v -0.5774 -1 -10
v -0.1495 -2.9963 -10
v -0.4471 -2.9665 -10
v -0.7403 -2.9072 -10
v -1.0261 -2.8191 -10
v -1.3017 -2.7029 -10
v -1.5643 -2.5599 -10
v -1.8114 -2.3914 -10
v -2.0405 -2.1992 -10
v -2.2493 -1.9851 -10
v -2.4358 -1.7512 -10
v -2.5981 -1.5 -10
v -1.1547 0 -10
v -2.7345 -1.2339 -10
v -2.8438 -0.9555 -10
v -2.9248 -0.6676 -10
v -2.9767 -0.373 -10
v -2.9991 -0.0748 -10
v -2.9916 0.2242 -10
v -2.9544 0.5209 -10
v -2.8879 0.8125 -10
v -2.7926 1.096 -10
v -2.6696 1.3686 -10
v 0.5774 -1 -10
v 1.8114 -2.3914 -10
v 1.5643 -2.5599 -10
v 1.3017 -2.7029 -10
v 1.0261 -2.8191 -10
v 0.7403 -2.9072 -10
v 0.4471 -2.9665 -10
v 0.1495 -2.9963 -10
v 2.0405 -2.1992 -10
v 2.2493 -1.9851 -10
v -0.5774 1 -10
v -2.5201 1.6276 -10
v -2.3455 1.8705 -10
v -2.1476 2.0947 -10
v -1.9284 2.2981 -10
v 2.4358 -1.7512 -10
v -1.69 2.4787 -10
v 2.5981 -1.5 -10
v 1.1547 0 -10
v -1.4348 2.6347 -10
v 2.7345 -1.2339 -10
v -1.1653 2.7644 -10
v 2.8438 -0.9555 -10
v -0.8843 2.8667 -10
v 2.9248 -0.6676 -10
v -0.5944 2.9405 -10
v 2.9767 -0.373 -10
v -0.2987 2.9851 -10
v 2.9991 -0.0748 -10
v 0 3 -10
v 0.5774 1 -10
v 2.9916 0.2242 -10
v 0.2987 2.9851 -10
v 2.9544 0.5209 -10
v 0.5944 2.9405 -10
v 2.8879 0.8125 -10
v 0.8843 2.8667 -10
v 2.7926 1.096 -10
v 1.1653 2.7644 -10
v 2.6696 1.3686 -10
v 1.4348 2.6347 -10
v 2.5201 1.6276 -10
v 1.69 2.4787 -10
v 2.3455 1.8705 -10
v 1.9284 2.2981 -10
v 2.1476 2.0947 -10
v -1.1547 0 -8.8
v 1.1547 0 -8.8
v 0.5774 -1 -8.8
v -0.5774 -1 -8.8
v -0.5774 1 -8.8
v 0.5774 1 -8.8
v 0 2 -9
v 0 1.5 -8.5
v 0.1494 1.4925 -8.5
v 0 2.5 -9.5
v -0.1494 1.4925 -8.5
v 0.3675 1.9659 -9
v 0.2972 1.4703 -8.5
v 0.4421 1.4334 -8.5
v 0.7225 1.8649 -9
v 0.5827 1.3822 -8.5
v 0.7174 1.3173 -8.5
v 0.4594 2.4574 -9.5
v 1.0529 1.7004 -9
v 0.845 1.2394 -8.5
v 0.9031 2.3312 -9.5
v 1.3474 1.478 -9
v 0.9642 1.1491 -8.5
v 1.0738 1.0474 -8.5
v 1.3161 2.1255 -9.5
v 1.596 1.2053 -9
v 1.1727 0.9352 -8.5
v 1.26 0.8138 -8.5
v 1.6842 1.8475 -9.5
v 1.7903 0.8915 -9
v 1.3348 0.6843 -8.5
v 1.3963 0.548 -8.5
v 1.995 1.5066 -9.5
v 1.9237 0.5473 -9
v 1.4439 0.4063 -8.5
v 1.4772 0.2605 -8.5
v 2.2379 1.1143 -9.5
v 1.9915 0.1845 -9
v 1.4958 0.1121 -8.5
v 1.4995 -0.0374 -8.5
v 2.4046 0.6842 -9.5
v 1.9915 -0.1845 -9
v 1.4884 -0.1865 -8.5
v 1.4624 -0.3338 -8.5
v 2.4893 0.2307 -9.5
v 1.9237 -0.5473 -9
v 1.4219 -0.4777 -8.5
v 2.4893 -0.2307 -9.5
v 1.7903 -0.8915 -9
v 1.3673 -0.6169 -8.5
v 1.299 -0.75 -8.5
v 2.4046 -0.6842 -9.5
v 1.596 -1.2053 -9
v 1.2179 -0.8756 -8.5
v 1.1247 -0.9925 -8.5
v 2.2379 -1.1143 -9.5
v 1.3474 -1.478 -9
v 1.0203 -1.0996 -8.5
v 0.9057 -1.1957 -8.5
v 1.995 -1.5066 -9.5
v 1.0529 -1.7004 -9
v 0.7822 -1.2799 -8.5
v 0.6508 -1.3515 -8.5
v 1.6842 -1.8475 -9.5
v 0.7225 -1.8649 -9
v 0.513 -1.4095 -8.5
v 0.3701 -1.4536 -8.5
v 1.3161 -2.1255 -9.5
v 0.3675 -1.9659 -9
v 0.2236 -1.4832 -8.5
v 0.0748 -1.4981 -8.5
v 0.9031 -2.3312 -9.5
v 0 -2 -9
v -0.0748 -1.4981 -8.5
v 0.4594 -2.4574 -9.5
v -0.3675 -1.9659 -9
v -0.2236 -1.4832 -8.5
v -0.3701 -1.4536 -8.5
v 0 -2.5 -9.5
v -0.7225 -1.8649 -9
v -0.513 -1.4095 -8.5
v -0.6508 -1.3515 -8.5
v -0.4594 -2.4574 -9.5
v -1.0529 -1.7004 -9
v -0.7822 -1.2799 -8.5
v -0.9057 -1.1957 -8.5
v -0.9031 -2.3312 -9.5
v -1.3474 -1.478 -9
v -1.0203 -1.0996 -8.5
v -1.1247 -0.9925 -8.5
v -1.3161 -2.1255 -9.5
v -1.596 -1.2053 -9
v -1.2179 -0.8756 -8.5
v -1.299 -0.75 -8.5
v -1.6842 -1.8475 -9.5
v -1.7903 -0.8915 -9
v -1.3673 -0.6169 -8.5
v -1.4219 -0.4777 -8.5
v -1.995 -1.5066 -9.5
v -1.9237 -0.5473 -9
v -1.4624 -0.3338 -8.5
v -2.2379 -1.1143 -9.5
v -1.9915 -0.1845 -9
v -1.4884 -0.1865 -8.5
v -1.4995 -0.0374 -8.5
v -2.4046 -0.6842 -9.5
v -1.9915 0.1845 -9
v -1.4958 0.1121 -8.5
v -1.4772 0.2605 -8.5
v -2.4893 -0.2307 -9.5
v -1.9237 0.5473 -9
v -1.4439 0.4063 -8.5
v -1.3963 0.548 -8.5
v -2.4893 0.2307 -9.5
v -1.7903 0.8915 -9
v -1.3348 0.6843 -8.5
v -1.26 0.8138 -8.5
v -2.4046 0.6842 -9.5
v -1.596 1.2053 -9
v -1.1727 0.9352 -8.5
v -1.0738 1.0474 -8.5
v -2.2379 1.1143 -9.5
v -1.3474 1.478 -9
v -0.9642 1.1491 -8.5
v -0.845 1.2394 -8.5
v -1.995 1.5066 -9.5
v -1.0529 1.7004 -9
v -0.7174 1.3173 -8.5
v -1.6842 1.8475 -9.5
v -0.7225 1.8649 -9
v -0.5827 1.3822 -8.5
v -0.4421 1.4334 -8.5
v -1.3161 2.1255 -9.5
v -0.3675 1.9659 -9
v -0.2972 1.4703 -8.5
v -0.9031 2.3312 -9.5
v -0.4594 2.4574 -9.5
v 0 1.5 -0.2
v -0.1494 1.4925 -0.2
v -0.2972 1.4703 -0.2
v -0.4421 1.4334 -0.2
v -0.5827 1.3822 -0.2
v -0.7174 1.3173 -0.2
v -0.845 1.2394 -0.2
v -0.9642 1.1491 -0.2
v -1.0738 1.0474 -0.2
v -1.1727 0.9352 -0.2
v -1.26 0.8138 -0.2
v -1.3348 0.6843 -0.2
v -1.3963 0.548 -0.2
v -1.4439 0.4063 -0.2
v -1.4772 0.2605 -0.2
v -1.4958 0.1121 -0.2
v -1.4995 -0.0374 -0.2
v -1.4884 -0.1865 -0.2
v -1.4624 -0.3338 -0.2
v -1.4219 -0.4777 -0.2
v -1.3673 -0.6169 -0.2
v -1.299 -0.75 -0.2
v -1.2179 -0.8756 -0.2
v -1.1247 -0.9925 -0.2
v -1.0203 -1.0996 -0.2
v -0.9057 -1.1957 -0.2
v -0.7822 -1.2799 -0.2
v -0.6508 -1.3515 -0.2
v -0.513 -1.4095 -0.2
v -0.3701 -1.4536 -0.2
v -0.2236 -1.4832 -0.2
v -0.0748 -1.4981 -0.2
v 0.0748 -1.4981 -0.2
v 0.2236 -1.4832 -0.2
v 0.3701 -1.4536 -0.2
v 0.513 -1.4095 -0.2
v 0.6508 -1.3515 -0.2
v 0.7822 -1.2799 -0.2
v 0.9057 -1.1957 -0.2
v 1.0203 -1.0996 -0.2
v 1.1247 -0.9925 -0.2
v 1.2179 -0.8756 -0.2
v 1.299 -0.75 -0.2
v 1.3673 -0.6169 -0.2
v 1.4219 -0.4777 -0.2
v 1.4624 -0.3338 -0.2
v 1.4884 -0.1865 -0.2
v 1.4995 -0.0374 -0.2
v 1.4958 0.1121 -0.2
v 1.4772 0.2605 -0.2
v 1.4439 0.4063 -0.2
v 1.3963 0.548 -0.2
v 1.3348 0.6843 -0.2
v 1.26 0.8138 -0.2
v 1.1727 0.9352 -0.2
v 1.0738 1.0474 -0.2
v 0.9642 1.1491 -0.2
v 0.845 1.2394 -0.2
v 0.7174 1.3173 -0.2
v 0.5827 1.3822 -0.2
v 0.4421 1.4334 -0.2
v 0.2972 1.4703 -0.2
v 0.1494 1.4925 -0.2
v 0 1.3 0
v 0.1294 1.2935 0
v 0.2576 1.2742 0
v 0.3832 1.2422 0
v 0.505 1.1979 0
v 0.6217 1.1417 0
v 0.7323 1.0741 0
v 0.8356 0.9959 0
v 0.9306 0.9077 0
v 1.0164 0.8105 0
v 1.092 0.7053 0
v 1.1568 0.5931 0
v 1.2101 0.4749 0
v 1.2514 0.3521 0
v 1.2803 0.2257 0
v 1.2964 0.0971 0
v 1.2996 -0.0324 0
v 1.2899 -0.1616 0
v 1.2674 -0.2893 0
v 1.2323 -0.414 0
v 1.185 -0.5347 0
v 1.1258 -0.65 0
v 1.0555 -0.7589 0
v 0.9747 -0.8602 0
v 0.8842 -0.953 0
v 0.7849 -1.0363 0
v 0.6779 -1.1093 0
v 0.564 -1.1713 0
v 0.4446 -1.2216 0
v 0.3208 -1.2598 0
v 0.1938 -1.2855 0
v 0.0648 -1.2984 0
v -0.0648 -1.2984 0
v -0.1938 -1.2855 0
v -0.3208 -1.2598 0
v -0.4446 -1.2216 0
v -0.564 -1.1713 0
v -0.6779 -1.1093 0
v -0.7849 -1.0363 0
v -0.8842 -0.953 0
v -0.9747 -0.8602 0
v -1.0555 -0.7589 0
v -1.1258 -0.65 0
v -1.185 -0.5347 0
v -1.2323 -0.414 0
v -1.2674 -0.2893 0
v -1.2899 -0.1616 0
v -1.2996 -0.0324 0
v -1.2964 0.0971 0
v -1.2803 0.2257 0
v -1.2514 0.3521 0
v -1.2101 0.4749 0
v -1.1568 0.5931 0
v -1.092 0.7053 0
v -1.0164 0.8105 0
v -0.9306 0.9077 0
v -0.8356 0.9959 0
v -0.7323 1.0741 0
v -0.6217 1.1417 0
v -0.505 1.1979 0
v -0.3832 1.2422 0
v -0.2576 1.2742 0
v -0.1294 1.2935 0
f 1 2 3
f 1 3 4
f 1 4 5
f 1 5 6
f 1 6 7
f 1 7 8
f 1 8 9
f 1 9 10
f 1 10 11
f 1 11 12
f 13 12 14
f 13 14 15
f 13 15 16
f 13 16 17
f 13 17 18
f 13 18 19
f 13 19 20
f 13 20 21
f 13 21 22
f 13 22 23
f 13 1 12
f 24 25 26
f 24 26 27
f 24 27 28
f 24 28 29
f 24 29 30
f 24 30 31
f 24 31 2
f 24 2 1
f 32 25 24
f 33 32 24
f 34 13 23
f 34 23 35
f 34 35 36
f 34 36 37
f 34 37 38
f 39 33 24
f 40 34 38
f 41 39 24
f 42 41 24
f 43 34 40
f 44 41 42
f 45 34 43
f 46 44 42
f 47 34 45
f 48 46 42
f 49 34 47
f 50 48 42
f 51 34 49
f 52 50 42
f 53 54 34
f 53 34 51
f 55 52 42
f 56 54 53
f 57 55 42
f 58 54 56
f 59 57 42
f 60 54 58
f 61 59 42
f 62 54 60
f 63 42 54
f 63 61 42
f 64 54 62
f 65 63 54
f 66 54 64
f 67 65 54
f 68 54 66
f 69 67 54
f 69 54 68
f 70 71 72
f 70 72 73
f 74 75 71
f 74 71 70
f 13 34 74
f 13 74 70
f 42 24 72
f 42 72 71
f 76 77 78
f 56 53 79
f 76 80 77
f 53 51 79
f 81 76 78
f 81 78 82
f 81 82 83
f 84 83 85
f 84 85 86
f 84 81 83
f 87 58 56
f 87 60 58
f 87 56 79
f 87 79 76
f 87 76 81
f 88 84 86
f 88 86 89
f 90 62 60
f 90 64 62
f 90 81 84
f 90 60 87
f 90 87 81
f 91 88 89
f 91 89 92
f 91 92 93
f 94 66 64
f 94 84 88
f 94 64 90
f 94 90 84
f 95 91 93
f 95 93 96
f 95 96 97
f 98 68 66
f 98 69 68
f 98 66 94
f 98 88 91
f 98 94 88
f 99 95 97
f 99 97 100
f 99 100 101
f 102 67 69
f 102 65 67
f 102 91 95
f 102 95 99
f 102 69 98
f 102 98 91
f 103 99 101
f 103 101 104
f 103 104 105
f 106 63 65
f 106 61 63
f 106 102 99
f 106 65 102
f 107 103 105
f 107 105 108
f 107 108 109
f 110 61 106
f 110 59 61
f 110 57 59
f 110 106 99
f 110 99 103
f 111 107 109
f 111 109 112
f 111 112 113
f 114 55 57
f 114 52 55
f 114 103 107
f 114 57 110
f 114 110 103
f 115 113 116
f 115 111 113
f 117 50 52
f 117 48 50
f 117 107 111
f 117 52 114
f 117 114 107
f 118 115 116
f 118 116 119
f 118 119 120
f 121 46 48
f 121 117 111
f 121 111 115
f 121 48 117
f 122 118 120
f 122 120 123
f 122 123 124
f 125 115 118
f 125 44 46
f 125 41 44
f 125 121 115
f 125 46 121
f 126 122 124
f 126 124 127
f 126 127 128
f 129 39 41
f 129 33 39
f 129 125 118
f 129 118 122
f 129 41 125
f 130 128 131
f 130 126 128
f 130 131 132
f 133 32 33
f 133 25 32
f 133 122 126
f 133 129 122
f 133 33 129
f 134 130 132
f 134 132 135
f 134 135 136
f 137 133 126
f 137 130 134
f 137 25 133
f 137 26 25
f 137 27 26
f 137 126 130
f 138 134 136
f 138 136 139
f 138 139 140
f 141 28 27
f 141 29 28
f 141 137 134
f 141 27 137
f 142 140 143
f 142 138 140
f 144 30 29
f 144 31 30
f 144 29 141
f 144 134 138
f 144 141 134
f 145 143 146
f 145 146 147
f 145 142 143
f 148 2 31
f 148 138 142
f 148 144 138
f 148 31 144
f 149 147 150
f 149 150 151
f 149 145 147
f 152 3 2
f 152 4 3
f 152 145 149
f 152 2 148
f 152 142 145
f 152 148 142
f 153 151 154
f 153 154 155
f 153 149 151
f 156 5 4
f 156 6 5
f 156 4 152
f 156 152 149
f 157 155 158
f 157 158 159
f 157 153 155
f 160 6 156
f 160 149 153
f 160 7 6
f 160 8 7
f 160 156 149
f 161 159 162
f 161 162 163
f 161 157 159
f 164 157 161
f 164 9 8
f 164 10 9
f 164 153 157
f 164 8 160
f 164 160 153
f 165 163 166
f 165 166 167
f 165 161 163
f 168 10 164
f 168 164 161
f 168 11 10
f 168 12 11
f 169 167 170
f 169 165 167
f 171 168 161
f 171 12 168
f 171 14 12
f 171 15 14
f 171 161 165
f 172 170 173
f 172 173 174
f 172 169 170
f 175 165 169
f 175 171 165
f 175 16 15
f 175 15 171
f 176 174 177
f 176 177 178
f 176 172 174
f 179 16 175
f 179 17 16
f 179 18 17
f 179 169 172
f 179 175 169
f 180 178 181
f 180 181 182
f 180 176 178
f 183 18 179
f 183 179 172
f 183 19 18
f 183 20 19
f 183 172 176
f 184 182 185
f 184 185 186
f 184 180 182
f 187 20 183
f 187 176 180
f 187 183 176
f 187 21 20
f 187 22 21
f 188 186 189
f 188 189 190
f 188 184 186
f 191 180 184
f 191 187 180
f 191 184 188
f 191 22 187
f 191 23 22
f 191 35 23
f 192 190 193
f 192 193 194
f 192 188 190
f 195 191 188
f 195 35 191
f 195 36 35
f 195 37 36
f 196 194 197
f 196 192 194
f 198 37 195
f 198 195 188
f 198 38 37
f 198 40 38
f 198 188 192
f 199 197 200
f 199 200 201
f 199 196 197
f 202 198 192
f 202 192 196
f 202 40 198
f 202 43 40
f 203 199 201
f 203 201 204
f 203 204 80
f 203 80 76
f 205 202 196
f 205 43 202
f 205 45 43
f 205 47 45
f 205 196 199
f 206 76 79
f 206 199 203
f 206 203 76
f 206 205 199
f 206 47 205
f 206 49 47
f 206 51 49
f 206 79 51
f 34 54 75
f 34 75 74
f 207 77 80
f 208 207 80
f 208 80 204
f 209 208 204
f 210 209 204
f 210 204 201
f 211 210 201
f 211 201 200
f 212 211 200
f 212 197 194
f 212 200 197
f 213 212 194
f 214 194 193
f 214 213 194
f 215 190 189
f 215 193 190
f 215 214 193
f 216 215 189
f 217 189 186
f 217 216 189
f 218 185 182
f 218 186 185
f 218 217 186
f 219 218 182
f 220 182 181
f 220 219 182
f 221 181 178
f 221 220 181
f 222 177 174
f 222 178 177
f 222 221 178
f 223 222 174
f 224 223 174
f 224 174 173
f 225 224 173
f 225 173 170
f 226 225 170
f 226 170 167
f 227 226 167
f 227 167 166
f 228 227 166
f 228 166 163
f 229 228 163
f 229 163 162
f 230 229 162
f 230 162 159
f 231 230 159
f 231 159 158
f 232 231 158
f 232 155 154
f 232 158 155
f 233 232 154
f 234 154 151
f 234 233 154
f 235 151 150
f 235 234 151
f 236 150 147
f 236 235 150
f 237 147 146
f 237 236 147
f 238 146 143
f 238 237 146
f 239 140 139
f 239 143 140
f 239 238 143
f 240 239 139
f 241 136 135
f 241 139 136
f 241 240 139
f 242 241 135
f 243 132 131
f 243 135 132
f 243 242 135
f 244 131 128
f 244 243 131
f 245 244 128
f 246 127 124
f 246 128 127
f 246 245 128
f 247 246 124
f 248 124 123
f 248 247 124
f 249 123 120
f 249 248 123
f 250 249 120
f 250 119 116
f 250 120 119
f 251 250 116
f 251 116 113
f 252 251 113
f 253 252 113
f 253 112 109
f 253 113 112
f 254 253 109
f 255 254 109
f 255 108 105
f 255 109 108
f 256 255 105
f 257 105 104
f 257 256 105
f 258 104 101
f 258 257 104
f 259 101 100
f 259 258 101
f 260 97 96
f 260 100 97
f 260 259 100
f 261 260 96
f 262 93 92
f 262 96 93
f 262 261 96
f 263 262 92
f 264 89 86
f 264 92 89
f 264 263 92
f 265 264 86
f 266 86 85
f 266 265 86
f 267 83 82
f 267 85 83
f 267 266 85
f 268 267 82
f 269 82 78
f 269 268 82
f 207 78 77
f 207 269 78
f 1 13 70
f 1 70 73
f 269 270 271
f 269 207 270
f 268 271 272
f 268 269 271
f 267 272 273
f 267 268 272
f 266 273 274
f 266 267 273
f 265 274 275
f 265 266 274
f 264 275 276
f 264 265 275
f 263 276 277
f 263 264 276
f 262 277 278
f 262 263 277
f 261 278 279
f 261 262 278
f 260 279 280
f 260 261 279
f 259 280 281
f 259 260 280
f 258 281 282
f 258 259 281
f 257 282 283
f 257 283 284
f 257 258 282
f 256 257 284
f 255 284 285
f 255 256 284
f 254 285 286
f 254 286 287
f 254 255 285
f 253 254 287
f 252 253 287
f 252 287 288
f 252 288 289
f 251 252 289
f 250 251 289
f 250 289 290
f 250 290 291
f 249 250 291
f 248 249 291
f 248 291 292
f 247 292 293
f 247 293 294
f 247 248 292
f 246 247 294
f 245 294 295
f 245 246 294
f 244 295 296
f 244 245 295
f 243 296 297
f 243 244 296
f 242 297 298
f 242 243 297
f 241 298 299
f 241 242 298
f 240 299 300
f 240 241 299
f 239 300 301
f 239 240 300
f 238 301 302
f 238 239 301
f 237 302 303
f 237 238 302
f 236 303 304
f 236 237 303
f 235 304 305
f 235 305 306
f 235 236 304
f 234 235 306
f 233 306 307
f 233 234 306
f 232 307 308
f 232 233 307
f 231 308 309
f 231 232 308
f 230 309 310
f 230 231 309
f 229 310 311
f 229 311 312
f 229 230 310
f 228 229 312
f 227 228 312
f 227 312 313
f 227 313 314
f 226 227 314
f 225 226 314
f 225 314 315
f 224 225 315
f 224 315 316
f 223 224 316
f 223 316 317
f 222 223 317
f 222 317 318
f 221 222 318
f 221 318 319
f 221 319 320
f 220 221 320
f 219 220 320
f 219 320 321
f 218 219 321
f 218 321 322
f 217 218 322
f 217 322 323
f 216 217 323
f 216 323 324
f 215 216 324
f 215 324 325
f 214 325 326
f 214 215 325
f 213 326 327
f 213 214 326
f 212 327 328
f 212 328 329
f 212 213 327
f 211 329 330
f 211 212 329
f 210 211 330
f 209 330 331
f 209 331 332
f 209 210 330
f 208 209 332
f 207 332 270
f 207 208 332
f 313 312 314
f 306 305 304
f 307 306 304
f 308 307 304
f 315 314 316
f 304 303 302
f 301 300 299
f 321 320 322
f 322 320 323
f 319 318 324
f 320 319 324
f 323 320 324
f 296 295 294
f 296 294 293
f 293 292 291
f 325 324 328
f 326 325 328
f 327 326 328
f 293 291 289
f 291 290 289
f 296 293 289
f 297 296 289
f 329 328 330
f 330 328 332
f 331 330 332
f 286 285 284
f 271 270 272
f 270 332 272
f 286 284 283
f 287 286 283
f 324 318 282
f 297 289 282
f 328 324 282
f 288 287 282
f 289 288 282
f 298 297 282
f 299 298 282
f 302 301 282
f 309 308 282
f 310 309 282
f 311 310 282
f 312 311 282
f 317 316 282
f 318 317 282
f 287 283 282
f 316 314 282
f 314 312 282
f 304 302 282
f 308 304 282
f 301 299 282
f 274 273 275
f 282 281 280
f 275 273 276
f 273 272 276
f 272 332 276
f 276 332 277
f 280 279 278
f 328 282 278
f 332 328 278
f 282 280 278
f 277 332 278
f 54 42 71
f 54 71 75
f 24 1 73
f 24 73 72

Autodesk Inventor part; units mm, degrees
ref_plane "YZ Plane" through (0, 0, 0) normal (1, 0, 0) x (0, 1, 0)
ref_plane "XZ Plane" through (0, 0, 0) normal (0, 1, 0) x (-1, 0, 0)
ref_plane "XY Plane" through (0, 0, 0) normal (0, 0, 1) x (1, 0, 0)
sketch "Sketch1" plane through (0, 0, 0) normal (1, 0, 0) x (0, 1, 0)
  line L0 (0, 0) -> (0, -10)
  line L1 (0, -10) -> (3, -10)
  line L2 (3, -10) -> (1.5, -8.5)
  line L3 (1.5, -8.5) -> (1.5, 0)
  line L4 (1.5, 0) -> (0, 0)
  dimension "d0" = 6
  dimension "d1" = 10
  dimension "d2" = 45
  dimension "d3" = 3
revolve "Revolution1" add sketch "Sketch1" angle 360 about axis through (0, 0, 0) along (0, 0, -1)
chamfer "Chamfer1" distance 0.2 angle 45 1 edges at (0, -1.5, 0)
thread "Thread1" size "M3x0.5" class "6g" standard "ANSI Metric M Profile" full length
sketch "Sketch2" plane through (0, 0, -10) normal (0, 0, -1) x (-1, 0, 0)
  circle A0 centre (0, 0) radius 1.3 projected
  line L0 (1.1547, 0) -> (0.5774, -1)
  line L1 (0.5774, -1) -> (-0.5774, -1)
  line L2 (-0.5774, -1) -> (-1.1547, 0)
  line L3 (-1.1547, 0) -> (-0.5774, 1)
  line L4 (-0.5774, 1) -> (0.5774, 1)
  line L5 (0.5774, 1) -> (1.1547, 0)
  dimension "d10" = 2
extrude "Extrusion1" cut sketch "Sketch2" against normal blind 1.2 contours L0 L1 L2 L3 L4 L5
properties part number "M3 x 10mm FHCS"
